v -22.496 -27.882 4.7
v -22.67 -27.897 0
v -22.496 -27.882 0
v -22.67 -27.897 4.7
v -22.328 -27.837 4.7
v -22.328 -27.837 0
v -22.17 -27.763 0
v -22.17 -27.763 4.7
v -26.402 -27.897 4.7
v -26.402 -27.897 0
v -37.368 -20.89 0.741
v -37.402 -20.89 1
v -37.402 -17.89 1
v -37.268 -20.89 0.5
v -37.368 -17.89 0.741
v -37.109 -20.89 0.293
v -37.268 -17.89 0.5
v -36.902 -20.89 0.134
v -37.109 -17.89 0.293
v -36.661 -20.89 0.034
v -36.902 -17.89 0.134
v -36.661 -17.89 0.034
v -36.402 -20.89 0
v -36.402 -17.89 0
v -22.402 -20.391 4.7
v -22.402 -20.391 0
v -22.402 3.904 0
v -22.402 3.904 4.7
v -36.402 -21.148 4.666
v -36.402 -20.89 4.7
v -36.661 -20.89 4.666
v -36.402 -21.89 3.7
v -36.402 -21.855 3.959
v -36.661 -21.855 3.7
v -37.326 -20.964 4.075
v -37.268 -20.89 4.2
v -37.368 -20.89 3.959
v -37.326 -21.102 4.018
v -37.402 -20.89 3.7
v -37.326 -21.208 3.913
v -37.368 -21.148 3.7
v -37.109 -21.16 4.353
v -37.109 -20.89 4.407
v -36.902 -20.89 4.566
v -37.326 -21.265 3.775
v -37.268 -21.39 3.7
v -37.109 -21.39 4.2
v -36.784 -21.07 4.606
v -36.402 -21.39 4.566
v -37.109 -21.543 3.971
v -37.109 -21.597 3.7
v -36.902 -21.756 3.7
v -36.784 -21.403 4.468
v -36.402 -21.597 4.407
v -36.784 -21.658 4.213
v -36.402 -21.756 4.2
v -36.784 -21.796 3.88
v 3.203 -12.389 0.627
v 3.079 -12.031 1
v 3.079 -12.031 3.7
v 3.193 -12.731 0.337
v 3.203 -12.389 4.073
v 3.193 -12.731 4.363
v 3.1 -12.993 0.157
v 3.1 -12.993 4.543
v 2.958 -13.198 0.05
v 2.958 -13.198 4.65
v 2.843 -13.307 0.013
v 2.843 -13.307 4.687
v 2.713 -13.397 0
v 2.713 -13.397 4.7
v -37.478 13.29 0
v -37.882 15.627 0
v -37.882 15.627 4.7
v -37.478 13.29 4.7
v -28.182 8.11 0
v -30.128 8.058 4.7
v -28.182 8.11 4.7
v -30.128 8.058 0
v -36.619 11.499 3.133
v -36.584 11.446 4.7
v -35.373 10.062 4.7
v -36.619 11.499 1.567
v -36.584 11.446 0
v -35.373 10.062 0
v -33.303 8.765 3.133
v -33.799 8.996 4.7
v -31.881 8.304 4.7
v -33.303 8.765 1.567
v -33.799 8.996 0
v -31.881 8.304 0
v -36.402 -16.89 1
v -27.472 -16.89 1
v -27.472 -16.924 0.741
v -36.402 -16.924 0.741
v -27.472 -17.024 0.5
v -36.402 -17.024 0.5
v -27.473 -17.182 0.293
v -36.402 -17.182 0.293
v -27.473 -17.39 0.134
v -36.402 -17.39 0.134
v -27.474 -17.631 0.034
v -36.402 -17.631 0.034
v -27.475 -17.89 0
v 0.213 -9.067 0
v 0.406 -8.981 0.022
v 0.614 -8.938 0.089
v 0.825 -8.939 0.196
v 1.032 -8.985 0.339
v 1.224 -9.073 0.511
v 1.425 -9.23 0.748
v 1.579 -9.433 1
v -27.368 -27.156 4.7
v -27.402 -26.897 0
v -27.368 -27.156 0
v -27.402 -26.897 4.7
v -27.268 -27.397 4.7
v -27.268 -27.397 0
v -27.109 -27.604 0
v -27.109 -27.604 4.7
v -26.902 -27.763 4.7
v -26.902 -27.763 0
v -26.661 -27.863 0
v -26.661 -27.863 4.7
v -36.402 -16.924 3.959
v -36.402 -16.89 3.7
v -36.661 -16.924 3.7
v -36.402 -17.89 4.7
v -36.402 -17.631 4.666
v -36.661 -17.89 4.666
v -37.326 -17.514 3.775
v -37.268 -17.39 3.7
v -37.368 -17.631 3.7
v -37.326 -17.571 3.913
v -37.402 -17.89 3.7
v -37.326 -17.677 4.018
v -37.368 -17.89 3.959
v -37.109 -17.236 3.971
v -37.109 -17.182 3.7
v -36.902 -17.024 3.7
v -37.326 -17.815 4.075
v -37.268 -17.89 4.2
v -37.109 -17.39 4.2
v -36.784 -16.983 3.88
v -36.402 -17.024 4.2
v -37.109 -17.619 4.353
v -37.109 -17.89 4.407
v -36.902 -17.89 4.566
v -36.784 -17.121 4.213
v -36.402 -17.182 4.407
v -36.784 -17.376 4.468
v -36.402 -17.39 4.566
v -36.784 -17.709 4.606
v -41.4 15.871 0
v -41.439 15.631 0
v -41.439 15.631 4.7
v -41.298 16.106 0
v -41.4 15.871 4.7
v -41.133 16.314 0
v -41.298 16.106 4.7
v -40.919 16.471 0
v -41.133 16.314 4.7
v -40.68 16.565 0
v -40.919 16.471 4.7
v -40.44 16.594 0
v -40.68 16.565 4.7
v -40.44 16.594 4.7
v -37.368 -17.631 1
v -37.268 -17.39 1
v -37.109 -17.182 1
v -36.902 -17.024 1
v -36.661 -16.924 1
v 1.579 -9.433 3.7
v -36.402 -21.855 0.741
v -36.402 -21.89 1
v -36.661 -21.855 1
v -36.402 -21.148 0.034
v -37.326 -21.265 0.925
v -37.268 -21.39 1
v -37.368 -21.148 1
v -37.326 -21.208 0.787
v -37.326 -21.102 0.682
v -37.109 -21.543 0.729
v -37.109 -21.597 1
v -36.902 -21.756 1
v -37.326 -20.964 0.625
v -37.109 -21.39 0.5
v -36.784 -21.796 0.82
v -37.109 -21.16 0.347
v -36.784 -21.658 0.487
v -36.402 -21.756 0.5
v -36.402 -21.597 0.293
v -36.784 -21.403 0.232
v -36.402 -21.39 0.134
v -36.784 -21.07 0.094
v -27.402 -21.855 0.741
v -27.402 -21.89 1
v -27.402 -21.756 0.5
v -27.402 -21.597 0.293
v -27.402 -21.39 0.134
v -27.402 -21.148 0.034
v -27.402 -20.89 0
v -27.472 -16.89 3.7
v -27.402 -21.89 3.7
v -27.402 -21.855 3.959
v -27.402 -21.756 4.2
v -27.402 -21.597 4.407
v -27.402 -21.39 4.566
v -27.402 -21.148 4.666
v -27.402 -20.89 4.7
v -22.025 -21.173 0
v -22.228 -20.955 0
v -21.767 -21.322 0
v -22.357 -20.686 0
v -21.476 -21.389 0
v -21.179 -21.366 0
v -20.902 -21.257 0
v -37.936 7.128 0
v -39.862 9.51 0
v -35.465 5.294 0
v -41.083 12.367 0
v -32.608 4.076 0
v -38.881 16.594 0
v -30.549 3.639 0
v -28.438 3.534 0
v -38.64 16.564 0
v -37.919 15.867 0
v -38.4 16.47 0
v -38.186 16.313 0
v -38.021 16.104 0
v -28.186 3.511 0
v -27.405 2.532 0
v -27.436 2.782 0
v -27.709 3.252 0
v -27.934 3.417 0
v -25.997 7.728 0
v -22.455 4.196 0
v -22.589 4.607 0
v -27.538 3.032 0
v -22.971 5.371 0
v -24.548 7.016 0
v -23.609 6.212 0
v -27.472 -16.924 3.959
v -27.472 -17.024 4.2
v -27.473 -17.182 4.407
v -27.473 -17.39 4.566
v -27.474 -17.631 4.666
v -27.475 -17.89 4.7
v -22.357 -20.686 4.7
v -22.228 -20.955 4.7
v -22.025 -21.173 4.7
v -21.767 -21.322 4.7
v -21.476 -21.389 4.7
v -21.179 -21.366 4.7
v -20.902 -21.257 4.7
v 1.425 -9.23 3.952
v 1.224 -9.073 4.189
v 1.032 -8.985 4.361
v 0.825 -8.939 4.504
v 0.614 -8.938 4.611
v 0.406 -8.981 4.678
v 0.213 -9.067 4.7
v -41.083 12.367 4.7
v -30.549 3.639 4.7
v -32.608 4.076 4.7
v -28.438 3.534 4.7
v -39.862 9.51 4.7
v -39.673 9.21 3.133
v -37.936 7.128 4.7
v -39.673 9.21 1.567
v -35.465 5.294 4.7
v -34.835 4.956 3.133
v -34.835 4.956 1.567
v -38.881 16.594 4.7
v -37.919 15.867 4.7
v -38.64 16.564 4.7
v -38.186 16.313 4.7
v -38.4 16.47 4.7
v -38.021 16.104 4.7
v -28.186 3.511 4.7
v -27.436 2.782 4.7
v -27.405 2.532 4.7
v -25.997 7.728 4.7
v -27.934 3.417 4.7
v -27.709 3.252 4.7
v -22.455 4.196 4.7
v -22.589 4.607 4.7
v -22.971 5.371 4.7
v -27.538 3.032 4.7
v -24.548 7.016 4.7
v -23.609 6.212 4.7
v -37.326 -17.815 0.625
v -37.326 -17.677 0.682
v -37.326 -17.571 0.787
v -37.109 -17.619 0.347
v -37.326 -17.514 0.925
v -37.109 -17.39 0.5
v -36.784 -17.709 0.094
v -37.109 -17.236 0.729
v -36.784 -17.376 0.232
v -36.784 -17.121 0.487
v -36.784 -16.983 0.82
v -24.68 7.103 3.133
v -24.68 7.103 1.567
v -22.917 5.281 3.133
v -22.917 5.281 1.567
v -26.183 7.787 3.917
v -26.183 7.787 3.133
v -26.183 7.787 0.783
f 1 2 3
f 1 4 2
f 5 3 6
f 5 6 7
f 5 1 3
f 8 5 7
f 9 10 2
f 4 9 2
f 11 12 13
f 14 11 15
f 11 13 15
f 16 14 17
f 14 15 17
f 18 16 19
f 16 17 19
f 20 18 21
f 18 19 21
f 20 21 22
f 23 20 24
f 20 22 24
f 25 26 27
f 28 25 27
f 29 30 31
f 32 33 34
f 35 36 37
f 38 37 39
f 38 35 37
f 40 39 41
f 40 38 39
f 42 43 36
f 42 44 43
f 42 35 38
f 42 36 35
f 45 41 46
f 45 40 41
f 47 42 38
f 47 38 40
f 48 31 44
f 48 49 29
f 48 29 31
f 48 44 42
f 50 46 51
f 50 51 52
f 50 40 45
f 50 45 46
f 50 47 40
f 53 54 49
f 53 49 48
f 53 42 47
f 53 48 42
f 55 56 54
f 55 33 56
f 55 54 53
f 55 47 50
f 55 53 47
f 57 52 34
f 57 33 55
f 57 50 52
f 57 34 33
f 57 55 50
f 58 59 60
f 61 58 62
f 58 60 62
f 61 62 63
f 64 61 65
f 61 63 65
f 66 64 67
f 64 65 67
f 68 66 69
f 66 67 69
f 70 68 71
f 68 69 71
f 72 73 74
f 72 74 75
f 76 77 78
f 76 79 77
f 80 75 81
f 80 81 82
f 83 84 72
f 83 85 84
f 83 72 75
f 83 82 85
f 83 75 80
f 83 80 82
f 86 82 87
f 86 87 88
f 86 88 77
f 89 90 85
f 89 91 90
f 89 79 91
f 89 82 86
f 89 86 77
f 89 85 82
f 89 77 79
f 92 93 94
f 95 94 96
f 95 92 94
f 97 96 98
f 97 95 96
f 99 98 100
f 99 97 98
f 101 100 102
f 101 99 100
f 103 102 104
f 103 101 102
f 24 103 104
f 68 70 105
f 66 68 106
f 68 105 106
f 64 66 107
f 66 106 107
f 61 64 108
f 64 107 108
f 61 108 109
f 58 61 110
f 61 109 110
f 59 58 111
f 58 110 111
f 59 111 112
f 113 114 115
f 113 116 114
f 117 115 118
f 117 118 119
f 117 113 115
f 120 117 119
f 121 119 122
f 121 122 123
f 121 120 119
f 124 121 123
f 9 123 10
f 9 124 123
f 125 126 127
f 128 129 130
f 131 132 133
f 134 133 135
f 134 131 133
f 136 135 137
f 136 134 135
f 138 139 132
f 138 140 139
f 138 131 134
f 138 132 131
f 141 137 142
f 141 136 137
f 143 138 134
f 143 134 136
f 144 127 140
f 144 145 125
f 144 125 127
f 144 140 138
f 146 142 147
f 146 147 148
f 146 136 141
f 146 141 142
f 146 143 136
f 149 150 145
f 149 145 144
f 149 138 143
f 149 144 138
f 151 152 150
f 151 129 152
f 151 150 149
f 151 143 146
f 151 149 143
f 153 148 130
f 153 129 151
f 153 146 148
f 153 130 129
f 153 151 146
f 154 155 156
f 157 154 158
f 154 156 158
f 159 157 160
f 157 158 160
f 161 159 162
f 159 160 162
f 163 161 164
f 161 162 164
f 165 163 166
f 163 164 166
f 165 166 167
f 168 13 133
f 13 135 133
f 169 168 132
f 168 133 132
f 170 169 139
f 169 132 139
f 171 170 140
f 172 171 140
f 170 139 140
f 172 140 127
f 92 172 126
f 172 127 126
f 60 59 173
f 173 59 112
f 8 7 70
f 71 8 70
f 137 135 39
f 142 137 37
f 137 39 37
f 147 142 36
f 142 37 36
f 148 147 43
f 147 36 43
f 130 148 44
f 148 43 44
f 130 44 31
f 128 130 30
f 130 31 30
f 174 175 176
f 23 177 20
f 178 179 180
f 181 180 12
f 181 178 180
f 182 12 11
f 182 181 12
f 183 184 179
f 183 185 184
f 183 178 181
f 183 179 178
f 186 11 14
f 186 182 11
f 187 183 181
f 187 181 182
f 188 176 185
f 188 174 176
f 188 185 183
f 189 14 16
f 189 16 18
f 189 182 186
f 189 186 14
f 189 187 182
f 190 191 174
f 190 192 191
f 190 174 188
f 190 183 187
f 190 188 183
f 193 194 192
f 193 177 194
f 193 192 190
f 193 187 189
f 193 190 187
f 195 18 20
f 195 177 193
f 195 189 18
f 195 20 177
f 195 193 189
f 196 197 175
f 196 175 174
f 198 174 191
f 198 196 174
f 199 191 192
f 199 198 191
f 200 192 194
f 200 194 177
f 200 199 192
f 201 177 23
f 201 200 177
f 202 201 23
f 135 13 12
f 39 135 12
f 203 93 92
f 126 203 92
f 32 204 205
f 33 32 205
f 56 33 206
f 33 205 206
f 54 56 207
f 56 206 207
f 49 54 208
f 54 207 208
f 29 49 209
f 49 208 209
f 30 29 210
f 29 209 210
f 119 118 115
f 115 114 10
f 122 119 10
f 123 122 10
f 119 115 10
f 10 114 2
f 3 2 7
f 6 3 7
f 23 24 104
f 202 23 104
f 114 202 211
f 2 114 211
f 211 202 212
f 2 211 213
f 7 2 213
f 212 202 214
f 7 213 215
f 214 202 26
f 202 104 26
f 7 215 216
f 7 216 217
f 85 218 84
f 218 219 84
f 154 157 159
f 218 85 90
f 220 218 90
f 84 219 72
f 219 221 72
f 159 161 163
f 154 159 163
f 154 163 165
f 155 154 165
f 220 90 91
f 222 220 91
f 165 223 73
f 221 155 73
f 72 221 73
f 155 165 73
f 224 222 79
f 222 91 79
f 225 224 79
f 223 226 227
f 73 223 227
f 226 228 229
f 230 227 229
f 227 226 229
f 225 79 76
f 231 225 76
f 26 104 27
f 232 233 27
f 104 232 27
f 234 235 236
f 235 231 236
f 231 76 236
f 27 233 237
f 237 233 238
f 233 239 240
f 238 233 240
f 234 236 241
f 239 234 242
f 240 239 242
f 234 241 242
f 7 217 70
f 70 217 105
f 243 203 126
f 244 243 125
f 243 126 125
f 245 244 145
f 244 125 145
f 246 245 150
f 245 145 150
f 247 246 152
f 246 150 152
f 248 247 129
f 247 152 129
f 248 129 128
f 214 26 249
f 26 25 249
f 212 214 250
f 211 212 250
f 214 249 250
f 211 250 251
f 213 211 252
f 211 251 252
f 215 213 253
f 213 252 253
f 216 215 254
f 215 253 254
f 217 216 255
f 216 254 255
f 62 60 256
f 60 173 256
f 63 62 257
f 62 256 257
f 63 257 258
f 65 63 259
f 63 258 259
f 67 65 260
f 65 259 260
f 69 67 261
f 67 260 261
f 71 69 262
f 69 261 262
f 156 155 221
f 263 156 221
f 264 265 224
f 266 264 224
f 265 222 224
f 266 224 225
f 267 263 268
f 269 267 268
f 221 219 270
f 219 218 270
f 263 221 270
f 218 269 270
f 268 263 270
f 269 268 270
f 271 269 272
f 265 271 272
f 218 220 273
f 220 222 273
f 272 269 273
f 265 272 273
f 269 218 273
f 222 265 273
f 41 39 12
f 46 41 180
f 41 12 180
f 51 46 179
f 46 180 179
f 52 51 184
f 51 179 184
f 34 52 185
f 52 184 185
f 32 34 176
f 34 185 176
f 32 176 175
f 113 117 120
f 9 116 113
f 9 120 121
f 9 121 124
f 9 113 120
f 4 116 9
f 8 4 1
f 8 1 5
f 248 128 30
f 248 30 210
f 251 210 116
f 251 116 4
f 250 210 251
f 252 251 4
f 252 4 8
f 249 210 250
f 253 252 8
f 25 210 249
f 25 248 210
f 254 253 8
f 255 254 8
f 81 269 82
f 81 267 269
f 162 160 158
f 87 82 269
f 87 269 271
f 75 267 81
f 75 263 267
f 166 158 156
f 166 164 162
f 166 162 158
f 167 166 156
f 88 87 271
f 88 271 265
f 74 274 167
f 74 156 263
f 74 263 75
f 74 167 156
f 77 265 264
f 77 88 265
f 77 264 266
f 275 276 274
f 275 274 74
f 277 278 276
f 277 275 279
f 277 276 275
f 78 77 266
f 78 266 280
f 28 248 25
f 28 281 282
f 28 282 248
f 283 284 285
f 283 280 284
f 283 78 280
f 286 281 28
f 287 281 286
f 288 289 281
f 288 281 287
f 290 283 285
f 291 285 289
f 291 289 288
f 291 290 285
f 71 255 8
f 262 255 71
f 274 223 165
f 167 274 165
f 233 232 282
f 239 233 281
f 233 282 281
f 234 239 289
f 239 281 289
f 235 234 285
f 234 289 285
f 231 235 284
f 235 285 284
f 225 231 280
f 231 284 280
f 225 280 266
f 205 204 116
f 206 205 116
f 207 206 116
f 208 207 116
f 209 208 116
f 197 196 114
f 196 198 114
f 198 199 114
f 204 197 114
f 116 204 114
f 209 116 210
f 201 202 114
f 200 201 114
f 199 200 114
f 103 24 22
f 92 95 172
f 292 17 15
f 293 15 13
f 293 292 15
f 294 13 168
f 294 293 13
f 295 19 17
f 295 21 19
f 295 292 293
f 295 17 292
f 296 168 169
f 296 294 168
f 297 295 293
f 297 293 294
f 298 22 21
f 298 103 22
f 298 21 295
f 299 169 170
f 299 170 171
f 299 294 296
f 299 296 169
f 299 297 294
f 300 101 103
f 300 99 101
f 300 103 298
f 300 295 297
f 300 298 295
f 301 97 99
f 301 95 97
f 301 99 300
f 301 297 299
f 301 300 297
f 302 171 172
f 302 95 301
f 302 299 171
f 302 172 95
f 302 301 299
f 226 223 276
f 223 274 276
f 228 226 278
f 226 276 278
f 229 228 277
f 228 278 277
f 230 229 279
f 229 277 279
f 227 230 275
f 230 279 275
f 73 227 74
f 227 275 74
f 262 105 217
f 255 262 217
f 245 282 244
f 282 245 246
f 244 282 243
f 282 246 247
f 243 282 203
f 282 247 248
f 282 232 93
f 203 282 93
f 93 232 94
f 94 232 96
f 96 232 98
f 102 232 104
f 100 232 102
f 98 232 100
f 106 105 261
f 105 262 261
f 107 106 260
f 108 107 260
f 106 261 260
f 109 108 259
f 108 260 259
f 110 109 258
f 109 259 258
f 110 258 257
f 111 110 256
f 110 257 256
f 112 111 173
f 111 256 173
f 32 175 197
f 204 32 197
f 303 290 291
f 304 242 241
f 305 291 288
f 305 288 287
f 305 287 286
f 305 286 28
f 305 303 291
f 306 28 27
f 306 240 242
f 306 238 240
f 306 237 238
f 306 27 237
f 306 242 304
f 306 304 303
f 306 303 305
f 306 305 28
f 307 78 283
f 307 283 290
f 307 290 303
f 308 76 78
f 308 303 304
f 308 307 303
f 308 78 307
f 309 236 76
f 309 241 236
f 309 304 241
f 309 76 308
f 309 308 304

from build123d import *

# Parameters (mm, degrees)
F1_DEPTH = 4.7
F2_R     = 1
F3_R     = 1
F4_R     = 1
F5_R     = 1
F6_R     = 1
F7_R     = 1


with BuildPart() as f1:
    # F0 (on Top) → F1 (new body)
    with BuildSketch(Plane.XY):
        with BuildLine():
            Line((-37.863488, 16.59382), (-41.363488, 16.59382))
            add(Edge.make_bspline(
                [(-41.363488, 16.59382), (-42.3331, 8.407068), (-34.69845, 2.771639), (-27.401726, 3.610343)],
                knots=[0, 0, 0, 0, 19.065714, 19.065714, 19.065714, 19.065714], degree=3))
            Line((-27.401726, 3.610343), (-27.471585, -16.889538))
            Line((-27.471585, -16.889538), (-37.401726, -16.889538))
            Line((-37.401726, -16.889538), (-37.401726, -21.889538))
            Line((-37.401726, -21.889538), (-27.401726, -21.889538))
            Line((-27.401726, -21.889538), (-27.401726, -27.896906))
            Line((-27.401726, -27.896906), (-22.401726, -27.896906))
            Line((-22.401726, -27.896906), (-22.401726, -22.123403))
            Line((-22.401726, -22.123403), (-22.401726, 3.903857))
            add(Edge.make_bspline(
                [(-28.18239, 8.110343), (-23.64683, 7.929841), (-22.457497, 4.639071), (-22.401726, 3.903857)],
                knots=[0, 0, 0, 0, 7.149168, 7.149168, 7.149168, 7.149168], degree=3))
            add(Edge.make_bspline(
                [(-37.863488, 16.59382), (-38.216218, 11.538417), (-34.533153, 7.455524), (-28.18239, 8.110343)],
                knots=[0, 0, 0, 0, 12.87218, 12.87218, 12.87218, 12.87218], degree=3))
        make_face()
        Polygon((1.079036, -8.566779), (-22.401726, -22.123403), (-22.401726, -27.896906), (3.579036, -12.896906), align=None)
    extrude(amount=F1_DEPTH)

    # F2
    f2_edges = [f1.edges().sort_by_distance(p)[0] for p in [
        (-32.436655, -16.889538, 4.7),
        (-32.436655, -16.889538, 0),
        (-32.401726, -21.889538, 4.7),
        (-32.401726, -21.889538, 0),
    ]]
    fillet(f2_edges, radius=F2_R)

    # F3
    f3_edges = [f1.edges().sort_by_distance(p)[0] for p in [
        (-27.401726, -27.896906, 2.35),
        (-27.401726, 3.610343, 2.35),
    ]]
    fillet(f3_edges, radius=F3_R)

    # F4
    f4_edges = [f1.edges().sort_by_distance(p)[0] for p in [
        (-41.363488, 16.59382, 2.35),
        (-37.863488, 16.59382, 2.35),
    ]]
    fillet(f4_edges, radius=F4_R)

    # F5
    f5_edges = [f1.edges().sort_by_distance(p)[0] for p in [
        (-22.401726, -22.123403, 2.35),
        (1.079036, -8.566779, 2.35),
        (3.579036, -12.896906, 2.35),
        (2.329036, -10.731842, 0),
        (2.329036, -10.731842, 4.7),
    ]]
    fillet(f5_edges, radius=F5_R)

    # F6
    f6_edges = [f1.edges().sort_by_distance(p)[0] for p in [
        (-37.401726, -16.889538, 2.35),
        (-37.401726, -17.182431, 0.292893),
        (-37.401726, -17.182431, 4.407107),
        (-37.401726, -19.389538, 0),
        (-37.401726, -19.389538, 4.7),
        (-37.401726, -21.596644, 0.292893),
        (-37.401726, -21.596644, 4.407107),
        (-37.401726, -21.889538, 2.35),
    ]]
    fillet(f6_edges, radius=F6_R)

    # F7
    f7_edges = [f1.edges().sort_by_distance(p)[0] for p in [
        (-22.401726, -27.896906, 2.35),
    ]]
    fillet(f7_edges, radius=F7_R)


solid = f1.part
